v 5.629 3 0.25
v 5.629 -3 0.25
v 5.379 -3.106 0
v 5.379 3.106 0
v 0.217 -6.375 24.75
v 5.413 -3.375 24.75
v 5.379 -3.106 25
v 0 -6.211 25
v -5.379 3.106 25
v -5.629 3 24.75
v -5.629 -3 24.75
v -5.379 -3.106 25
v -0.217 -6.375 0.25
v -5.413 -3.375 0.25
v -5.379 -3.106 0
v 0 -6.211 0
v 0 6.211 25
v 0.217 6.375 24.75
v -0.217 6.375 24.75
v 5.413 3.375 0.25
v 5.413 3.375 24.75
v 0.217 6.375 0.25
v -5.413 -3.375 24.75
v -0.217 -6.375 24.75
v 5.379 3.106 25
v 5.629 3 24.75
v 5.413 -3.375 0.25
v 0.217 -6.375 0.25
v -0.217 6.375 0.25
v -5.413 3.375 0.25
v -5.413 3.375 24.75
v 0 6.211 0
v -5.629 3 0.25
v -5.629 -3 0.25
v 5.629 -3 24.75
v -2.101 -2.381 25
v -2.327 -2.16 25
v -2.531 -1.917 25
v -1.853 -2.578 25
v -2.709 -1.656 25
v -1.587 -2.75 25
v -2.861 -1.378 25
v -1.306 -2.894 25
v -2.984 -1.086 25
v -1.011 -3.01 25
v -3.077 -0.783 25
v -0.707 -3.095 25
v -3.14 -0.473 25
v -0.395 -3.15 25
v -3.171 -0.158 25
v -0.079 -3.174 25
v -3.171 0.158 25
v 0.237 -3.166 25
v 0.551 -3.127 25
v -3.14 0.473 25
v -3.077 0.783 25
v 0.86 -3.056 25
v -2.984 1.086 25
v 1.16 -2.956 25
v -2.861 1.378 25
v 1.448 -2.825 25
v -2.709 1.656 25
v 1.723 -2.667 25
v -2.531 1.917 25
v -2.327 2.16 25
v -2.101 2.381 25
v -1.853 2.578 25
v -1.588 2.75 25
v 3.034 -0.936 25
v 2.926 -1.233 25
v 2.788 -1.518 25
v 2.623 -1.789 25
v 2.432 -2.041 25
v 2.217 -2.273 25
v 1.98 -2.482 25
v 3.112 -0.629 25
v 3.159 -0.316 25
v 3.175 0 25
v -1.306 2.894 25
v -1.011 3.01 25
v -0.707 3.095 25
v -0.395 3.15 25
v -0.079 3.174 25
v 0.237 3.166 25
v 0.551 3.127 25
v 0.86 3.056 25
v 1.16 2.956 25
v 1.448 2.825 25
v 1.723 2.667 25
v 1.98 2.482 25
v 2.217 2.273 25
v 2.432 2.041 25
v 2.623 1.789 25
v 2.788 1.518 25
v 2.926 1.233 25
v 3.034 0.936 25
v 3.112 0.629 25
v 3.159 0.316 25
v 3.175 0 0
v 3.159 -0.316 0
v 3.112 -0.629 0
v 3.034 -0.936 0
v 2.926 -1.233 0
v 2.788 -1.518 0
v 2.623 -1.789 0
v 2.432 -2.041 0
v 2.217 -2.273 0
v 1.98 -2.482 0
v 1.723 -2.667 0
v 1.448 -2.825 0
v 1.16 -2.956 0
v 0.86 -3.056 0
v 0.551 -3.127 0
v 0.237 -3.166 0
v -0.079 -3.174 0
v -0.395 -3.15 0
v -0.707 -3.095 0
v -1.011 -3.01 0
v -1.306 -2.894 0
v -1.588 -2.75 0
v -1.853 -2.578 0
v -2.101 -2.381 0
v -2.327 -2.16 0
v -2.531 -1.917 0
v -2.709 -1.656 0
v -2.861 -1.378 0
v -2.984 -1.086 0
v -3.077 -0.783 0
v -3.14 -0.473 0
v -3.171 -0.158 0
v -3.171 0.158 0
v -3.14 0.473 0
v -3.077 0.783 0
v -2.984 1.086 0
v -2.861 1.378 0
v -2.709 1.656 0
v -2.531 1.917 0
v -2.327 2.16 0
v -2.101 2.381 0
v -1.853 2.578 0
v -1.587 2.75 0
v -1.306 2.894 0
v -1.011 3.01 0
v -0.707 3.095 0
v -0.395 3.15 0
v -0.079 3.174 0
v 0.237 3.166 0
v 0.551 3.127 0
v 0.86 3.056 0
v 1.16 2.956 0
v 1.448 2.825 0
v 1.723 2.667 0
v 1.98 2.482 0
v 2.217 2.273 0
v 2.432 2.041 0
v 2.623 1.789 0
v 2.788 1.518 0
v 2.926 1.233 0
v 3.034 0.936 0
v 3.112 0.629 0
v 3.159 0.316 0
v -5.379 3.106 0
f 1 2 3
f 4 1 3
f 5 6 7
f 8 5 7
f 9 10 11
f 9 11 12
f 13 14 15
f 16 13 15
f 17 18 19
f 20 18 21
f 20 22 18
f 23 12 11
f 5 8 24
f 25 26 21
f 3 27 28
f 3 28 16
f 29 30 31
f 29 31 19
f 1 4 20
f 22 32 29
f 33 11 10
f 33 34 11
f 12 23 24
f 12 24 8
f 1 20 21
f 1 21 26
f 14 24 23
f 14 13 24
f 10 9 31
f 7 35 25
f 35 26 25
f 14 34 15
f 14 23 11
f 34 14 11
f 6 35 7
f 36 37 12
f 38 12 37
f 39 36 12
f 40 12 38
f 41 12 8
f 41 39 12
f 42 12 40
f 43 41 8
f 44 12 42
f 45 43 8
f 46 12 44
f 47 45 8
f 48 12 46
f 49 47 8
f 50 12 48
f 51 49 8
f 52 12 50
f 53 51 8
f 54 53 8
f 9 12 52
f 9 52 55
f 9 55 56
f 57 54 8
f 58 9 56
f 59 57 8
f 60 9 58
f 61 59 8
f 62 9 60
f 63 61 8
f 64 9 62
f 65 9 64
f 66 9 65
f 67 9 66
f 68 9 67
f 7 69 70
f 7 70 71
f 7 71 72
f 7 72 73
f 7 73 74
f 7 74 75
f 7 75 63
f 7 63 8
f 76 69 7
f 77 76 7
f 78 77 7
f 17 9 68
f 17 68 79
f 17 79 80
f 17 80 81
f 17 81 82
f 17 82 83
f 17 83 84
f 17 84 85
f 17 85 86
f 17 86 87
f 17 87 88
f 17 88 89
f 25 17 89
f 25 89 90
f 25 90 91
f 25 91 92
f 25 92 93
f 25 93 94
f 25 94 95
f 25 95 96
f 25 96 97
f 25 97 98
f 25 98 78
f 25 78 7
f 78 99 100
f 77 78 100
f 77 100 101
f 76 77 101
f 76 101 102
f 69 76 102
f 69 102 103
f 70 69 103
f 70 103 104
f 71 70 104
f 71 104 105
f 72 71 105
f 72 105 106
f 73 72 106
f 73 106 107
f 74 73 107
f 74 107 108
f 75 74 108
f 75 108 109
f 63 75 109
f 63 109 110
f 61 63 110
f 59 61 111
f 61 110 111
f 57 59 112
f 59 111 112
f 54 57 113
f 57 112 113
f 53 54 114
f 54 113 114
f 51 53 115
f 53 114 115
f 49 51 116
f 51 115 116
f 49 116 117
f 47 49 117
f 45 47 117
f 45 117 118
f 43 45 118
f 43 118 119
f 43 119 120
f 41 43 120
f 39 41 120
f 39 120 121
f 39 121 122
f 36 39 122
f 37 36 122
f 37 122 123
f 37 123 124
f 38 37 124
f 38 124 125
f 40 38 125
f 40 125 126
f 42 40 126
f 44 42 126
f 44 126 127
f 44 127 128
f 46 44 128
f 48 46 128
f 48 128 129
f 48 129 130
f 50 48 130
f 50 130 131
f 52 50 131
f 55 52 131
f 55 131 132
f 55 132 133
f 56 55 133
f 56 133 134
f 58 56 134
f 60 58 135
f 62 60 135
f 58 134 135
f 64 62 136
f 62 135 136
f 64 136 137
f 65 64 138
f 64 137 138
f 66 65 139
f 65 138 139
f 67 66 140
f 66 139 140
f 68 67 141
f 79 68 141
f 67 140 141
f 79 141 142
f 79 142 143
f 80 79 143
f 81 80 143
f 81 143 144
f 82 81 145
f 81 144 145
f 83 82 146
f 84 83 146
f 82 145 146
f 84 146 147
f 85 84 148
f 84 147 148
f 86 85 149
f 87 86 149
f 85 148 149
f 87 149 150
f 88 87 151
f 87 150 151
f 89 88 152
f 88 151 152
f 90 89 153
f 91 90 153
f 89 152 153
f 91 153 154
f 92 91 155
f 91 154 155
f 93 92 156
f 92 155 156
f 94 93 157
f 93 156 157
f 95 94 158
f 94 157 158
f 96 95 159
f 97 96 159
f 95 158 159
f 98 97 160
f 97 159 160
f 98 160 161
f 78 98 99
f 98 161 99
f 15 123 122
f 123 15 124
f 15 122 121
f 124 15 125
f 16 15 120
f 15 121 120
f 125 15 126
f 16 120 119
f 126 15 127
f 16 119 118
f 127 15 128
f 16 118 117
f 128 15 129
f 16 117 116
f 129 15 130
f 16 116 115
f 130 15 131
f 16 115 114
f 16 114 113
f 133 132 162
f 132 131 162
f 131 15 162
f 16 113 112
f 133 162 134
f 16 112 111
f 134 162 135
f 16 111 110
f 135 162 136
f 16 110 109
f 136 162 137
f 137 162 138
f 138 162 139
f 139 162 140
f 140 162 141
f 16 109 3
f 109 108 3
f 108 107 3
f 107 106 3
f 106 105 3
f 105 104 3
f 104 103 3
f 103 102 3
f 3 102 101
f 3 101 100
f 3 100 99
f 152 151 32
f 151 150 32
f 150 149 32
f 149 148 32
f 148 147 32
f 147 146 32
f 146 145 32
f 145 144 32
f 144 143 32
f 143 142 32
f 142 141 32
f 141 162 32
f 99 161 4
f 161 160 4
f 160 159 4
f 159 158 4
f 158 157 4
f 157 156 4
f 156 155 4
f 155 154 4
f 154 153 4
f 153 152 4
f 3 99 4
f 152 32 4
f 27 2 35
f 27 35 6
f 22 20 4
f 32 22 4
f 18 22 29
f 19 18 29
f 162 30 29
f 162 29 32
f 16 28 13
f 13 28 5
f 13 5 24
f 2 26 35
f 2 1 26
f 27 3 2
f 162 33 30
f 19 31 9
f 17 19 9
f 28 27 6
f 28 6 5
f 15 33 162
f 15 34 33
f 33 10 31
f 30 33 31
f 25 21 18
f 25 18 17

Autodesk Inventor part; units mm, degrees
ref_plane "YZ Plane" through (0, 0, 0) normal (1, 0, 0) x (0, 1, 0)
ref_plane "XZ Plane" through (0, 0, 0) normal (0, 1, 0) x (-1, 0, 0)
ref_plane "XY Plane" through (0, 0, 0) normal (0, 0, 1) x (1, 0, 0)
sketch "Sketch1" plane through (0, 0, 0) normal (0, 0, 1) x (1, 0, 0)
  line L0 (0, 0) -> (0, 6.5)
  line L1 (0, 6.5) -> (5.6292, 3.25)
  line L2 (0, 6.5) -> (6.5, 6.5) construction
  line L3 (5.6292, 3.25) -> (5.6292, -3.25)
  line L4 (5.6292, -3.25) -> (0, -6.5)
  line L5 (0, -6.5) -> (-5.6292, -3.25)
  line L6 (-5.6292, -3.25) -> (-5.6292, 3.25)
  line L7 (-5.6292, 3.25) -> (0, 6.5)
  circle A0 centre (0, 0) radius 3.175
  dimension "d1" = 6.5
  dimension "d2" = 30
  dimension "d3" = 6.35
extrude "Extrusion1" add sketch "Sketch1" along normal blind 25
chamfer "Chamfer1" distance 0.25 angle 45 18 edges at (2.8146, 4.875, 25) (5.6292, 0, 25) (2.8146, -4.875, 25) (-2.8146, -4.875, 25) (-5.6292, 0, 25) (-2.8146, 4.875, 25) (0, 6.5, 12.5) (5.6292, 3.25, 12.5) (5.6292, -3.25, 12.5) (0, -6.5, 12.5) (-5.6292, -3.25, 12.5) (-5.6292, 3.25, 12.5) (-2.8146, 4.875, 0) (-5.6292, 0, 0) (-2.8146, -4.875, 0) (2.8146, -4.875, 0) (5.6292, 0, 0) (2.8146, 4.875, 0)
thread "Thread1" size "1/4-20 UNC" class "2B" standard "ANSI Unified Screw Threads" full length
properties part number "5002_Brass_Nut_Tx_Rx_Relative_Positioning_MPSv2_v1" material "Brass, Soft Yellow"
